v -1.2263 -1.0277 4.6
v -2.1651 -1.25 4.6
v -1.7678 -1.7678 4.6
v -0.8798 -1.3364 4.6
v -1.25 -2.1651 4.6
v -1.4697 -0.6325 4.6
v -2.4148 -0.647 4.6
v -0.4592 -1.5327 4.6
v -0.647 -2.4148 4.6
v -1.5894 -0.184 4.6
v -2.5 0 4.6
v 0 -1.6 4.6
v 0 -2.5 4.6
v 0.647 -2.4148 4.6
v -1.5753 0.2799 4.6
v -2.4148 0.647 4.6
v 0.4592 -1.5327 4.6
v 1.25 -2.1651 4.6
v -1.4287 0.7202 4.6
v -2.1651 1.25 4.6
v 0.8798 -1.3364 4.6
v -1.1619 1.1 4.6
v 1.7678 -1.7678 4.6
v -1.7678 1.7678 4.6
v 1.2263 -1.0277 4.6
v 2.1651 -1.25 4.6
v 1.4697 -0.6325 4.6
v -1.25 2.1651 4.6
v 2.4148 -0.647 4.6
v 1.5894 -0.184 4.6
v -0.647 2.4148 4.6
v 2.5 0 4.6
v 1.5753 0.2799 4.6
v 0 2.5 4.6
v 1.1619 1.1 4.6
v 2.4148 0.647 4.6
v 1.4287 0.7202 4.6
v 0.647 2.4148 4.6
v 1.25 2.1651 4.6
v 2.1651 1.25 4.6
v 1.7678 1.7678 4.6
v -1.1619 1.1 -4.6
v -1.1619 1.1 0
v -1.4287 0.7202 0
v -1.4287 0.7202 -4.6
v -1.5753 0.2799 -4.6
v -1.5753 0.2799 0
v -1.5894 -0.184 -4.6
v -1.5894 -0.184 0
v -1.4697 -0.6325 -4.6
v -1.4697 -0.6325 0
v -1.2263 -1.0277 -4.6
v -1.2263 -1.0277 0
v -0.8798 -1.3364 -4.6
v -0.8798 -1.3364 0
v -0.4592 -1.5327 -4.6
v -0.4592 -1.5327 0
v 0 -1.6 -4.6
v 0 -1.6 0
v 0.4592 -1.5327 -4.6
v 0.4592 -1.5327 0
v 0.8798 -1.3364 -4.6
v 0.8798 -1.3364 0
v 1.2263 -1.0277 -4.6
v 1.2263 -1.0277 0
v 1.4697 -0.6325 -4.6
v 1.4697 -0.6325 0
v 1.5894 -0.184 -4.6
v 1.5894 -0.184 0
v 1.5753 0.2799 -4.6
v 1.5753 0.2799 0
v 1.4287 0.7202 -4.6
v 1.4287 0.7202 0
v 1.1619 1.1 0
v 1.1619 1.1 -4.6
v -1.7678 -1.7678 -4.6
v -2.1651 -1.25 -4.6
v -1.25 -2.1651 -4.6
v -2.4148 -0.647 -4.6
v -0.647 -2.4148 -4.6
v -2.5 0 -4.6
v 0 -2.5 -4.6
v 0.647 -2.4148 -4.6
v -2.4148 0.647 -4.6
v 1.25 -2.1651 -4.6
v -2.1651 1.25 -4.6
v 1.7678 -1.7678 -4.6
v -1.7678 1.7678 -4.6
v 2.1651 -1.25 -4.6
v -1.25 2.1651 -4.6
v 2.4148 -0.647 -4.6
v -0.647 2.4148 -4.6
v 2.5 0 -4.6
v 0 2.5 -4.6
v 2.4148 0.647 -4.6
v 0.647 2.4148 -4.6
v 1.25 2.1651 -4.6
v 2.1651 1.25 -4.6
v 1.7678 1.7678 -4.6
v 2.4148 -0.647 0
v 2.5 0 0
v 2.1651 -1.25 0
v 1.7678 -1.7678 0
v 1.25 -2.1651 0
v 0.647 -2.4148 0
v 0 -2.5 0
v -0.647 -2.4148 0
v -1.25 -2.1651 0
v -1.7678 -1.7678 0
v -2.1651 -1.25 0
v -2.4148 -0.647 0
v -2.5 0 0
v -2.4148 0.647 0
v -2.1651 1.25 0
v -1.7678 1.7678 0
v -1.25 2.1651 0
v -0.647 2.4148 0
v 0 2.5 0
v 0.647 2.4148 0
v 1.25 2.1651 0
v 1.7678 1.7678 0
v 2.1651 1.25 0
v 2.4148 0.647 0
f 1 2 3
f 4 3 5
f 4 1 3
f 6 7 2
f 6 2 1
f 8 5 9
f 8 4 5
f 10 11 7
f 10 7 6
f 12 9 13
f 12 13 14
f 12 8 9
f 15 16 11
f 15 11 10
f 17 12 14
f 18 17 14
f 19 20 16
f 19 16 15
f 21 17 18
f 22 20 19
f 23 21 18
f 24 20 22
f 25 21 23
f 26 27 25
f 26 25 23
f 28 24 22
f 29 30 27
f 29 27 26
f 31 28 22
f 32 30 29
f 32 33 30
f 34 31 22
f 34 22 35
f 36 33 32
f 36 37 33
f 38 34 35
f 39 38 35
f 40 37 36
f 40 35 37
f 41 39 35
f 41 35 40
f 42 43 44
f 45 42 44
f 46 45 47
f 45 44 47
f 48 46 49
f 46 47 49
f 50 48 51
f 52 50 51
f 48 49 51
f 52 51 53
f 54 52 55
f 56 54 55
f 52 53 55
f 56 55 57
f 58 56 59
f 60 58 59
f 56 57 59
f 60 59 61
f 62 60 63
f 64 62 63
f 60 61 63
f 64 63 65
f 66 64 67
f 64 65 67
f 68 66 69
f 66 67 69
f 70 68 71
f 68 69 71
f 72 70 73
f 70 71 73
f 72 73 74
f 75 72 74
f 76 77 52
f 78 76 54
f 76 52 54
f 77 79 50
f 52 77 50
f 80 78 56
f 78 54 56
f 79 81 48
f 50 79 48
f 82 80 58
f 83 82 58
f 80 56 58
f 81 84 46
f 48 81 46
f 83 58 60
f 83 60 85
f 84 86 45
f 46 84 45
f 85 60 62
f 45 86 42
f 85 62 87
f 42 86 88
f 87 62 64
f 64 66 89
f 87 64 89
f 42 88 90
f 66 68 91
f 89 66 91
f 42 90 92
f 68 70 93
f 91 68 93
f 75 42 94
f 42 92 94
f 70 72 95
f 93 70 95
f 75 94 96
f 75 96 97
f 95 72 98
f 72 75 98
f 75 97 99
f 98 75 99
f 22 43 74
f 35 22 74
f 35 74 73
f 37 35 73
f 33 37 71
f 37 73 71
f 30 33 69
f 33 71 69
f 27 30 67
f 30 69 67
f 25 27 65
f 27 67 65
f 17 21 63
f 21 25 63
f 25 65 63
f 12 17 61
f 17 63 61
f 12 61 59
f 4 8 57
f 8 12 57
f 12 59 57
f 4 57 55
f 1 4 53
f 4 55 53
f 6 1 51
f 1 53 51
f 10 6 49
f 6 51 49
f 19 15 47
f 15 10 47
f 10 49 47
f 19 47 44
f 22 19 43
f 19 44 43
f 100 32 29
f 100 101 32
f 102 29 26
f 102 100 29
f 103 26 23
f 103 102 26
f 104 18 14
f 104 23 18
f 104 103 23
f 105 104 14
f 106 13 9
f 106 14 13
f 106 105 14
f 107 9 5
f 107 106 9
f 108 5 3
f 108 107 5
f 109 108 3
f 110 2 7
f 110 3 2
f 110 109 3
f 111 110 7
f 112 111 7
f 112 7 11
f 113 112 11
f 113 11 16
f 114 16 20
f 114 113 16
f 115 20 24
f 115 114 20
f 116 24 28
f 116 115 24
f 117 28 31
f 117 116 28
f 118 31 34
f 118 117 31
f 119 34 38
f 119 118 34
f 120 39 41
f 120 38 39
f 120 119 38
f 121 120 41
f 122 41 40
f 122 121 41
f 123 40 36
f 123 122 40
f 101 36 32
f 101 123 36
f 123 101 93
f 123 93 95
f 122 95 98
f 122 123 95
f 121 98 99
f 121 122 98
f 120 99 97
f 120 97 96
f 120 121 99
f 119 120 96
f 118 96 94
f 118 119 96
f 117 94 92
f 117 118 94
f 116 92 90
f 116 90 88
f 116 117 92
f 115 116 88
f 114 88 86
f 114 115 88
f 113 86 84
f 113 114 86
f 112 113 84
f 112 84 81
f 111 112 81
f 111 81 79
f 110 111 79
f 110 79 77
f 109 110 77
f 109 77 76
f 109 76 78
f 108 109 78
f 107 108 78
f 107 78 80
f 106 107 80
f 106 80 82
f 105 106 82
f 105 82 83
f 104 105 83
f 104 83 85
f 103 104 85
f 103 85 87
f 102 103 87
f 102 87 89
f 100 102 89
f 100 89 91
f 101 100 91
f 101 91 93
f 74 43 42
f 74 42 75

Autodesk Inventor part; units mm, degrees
sketch "Sketch1" plane through (0, 0, 0) normal (0, 0, 1) x (1, 0, 0)
  circle A0 centre (0, 0) radius 2.5
  line L0 (-1.118, 1) -> (1.118, 1) projected
  arc A1 (-1.118, 1) -> (1.118, 1) centre (0, 0) ccw projected
  line L1 (-1.1619, 1.1) -> (1.1619, 1.1)
  arc A2 (-1.1619, 1.1) -> (1.1619, 1.1) centre (0, 0) ccw
  dimension "d1" = 3.2
  dimension "d0" = 5
  dimension "d4" = 0.5
extrude "Extrusion2" add sketch "Sketch1" along normal mid plane 9.2 contours A0
properties part number "conector_motor_001" material "ABS Plastic"
